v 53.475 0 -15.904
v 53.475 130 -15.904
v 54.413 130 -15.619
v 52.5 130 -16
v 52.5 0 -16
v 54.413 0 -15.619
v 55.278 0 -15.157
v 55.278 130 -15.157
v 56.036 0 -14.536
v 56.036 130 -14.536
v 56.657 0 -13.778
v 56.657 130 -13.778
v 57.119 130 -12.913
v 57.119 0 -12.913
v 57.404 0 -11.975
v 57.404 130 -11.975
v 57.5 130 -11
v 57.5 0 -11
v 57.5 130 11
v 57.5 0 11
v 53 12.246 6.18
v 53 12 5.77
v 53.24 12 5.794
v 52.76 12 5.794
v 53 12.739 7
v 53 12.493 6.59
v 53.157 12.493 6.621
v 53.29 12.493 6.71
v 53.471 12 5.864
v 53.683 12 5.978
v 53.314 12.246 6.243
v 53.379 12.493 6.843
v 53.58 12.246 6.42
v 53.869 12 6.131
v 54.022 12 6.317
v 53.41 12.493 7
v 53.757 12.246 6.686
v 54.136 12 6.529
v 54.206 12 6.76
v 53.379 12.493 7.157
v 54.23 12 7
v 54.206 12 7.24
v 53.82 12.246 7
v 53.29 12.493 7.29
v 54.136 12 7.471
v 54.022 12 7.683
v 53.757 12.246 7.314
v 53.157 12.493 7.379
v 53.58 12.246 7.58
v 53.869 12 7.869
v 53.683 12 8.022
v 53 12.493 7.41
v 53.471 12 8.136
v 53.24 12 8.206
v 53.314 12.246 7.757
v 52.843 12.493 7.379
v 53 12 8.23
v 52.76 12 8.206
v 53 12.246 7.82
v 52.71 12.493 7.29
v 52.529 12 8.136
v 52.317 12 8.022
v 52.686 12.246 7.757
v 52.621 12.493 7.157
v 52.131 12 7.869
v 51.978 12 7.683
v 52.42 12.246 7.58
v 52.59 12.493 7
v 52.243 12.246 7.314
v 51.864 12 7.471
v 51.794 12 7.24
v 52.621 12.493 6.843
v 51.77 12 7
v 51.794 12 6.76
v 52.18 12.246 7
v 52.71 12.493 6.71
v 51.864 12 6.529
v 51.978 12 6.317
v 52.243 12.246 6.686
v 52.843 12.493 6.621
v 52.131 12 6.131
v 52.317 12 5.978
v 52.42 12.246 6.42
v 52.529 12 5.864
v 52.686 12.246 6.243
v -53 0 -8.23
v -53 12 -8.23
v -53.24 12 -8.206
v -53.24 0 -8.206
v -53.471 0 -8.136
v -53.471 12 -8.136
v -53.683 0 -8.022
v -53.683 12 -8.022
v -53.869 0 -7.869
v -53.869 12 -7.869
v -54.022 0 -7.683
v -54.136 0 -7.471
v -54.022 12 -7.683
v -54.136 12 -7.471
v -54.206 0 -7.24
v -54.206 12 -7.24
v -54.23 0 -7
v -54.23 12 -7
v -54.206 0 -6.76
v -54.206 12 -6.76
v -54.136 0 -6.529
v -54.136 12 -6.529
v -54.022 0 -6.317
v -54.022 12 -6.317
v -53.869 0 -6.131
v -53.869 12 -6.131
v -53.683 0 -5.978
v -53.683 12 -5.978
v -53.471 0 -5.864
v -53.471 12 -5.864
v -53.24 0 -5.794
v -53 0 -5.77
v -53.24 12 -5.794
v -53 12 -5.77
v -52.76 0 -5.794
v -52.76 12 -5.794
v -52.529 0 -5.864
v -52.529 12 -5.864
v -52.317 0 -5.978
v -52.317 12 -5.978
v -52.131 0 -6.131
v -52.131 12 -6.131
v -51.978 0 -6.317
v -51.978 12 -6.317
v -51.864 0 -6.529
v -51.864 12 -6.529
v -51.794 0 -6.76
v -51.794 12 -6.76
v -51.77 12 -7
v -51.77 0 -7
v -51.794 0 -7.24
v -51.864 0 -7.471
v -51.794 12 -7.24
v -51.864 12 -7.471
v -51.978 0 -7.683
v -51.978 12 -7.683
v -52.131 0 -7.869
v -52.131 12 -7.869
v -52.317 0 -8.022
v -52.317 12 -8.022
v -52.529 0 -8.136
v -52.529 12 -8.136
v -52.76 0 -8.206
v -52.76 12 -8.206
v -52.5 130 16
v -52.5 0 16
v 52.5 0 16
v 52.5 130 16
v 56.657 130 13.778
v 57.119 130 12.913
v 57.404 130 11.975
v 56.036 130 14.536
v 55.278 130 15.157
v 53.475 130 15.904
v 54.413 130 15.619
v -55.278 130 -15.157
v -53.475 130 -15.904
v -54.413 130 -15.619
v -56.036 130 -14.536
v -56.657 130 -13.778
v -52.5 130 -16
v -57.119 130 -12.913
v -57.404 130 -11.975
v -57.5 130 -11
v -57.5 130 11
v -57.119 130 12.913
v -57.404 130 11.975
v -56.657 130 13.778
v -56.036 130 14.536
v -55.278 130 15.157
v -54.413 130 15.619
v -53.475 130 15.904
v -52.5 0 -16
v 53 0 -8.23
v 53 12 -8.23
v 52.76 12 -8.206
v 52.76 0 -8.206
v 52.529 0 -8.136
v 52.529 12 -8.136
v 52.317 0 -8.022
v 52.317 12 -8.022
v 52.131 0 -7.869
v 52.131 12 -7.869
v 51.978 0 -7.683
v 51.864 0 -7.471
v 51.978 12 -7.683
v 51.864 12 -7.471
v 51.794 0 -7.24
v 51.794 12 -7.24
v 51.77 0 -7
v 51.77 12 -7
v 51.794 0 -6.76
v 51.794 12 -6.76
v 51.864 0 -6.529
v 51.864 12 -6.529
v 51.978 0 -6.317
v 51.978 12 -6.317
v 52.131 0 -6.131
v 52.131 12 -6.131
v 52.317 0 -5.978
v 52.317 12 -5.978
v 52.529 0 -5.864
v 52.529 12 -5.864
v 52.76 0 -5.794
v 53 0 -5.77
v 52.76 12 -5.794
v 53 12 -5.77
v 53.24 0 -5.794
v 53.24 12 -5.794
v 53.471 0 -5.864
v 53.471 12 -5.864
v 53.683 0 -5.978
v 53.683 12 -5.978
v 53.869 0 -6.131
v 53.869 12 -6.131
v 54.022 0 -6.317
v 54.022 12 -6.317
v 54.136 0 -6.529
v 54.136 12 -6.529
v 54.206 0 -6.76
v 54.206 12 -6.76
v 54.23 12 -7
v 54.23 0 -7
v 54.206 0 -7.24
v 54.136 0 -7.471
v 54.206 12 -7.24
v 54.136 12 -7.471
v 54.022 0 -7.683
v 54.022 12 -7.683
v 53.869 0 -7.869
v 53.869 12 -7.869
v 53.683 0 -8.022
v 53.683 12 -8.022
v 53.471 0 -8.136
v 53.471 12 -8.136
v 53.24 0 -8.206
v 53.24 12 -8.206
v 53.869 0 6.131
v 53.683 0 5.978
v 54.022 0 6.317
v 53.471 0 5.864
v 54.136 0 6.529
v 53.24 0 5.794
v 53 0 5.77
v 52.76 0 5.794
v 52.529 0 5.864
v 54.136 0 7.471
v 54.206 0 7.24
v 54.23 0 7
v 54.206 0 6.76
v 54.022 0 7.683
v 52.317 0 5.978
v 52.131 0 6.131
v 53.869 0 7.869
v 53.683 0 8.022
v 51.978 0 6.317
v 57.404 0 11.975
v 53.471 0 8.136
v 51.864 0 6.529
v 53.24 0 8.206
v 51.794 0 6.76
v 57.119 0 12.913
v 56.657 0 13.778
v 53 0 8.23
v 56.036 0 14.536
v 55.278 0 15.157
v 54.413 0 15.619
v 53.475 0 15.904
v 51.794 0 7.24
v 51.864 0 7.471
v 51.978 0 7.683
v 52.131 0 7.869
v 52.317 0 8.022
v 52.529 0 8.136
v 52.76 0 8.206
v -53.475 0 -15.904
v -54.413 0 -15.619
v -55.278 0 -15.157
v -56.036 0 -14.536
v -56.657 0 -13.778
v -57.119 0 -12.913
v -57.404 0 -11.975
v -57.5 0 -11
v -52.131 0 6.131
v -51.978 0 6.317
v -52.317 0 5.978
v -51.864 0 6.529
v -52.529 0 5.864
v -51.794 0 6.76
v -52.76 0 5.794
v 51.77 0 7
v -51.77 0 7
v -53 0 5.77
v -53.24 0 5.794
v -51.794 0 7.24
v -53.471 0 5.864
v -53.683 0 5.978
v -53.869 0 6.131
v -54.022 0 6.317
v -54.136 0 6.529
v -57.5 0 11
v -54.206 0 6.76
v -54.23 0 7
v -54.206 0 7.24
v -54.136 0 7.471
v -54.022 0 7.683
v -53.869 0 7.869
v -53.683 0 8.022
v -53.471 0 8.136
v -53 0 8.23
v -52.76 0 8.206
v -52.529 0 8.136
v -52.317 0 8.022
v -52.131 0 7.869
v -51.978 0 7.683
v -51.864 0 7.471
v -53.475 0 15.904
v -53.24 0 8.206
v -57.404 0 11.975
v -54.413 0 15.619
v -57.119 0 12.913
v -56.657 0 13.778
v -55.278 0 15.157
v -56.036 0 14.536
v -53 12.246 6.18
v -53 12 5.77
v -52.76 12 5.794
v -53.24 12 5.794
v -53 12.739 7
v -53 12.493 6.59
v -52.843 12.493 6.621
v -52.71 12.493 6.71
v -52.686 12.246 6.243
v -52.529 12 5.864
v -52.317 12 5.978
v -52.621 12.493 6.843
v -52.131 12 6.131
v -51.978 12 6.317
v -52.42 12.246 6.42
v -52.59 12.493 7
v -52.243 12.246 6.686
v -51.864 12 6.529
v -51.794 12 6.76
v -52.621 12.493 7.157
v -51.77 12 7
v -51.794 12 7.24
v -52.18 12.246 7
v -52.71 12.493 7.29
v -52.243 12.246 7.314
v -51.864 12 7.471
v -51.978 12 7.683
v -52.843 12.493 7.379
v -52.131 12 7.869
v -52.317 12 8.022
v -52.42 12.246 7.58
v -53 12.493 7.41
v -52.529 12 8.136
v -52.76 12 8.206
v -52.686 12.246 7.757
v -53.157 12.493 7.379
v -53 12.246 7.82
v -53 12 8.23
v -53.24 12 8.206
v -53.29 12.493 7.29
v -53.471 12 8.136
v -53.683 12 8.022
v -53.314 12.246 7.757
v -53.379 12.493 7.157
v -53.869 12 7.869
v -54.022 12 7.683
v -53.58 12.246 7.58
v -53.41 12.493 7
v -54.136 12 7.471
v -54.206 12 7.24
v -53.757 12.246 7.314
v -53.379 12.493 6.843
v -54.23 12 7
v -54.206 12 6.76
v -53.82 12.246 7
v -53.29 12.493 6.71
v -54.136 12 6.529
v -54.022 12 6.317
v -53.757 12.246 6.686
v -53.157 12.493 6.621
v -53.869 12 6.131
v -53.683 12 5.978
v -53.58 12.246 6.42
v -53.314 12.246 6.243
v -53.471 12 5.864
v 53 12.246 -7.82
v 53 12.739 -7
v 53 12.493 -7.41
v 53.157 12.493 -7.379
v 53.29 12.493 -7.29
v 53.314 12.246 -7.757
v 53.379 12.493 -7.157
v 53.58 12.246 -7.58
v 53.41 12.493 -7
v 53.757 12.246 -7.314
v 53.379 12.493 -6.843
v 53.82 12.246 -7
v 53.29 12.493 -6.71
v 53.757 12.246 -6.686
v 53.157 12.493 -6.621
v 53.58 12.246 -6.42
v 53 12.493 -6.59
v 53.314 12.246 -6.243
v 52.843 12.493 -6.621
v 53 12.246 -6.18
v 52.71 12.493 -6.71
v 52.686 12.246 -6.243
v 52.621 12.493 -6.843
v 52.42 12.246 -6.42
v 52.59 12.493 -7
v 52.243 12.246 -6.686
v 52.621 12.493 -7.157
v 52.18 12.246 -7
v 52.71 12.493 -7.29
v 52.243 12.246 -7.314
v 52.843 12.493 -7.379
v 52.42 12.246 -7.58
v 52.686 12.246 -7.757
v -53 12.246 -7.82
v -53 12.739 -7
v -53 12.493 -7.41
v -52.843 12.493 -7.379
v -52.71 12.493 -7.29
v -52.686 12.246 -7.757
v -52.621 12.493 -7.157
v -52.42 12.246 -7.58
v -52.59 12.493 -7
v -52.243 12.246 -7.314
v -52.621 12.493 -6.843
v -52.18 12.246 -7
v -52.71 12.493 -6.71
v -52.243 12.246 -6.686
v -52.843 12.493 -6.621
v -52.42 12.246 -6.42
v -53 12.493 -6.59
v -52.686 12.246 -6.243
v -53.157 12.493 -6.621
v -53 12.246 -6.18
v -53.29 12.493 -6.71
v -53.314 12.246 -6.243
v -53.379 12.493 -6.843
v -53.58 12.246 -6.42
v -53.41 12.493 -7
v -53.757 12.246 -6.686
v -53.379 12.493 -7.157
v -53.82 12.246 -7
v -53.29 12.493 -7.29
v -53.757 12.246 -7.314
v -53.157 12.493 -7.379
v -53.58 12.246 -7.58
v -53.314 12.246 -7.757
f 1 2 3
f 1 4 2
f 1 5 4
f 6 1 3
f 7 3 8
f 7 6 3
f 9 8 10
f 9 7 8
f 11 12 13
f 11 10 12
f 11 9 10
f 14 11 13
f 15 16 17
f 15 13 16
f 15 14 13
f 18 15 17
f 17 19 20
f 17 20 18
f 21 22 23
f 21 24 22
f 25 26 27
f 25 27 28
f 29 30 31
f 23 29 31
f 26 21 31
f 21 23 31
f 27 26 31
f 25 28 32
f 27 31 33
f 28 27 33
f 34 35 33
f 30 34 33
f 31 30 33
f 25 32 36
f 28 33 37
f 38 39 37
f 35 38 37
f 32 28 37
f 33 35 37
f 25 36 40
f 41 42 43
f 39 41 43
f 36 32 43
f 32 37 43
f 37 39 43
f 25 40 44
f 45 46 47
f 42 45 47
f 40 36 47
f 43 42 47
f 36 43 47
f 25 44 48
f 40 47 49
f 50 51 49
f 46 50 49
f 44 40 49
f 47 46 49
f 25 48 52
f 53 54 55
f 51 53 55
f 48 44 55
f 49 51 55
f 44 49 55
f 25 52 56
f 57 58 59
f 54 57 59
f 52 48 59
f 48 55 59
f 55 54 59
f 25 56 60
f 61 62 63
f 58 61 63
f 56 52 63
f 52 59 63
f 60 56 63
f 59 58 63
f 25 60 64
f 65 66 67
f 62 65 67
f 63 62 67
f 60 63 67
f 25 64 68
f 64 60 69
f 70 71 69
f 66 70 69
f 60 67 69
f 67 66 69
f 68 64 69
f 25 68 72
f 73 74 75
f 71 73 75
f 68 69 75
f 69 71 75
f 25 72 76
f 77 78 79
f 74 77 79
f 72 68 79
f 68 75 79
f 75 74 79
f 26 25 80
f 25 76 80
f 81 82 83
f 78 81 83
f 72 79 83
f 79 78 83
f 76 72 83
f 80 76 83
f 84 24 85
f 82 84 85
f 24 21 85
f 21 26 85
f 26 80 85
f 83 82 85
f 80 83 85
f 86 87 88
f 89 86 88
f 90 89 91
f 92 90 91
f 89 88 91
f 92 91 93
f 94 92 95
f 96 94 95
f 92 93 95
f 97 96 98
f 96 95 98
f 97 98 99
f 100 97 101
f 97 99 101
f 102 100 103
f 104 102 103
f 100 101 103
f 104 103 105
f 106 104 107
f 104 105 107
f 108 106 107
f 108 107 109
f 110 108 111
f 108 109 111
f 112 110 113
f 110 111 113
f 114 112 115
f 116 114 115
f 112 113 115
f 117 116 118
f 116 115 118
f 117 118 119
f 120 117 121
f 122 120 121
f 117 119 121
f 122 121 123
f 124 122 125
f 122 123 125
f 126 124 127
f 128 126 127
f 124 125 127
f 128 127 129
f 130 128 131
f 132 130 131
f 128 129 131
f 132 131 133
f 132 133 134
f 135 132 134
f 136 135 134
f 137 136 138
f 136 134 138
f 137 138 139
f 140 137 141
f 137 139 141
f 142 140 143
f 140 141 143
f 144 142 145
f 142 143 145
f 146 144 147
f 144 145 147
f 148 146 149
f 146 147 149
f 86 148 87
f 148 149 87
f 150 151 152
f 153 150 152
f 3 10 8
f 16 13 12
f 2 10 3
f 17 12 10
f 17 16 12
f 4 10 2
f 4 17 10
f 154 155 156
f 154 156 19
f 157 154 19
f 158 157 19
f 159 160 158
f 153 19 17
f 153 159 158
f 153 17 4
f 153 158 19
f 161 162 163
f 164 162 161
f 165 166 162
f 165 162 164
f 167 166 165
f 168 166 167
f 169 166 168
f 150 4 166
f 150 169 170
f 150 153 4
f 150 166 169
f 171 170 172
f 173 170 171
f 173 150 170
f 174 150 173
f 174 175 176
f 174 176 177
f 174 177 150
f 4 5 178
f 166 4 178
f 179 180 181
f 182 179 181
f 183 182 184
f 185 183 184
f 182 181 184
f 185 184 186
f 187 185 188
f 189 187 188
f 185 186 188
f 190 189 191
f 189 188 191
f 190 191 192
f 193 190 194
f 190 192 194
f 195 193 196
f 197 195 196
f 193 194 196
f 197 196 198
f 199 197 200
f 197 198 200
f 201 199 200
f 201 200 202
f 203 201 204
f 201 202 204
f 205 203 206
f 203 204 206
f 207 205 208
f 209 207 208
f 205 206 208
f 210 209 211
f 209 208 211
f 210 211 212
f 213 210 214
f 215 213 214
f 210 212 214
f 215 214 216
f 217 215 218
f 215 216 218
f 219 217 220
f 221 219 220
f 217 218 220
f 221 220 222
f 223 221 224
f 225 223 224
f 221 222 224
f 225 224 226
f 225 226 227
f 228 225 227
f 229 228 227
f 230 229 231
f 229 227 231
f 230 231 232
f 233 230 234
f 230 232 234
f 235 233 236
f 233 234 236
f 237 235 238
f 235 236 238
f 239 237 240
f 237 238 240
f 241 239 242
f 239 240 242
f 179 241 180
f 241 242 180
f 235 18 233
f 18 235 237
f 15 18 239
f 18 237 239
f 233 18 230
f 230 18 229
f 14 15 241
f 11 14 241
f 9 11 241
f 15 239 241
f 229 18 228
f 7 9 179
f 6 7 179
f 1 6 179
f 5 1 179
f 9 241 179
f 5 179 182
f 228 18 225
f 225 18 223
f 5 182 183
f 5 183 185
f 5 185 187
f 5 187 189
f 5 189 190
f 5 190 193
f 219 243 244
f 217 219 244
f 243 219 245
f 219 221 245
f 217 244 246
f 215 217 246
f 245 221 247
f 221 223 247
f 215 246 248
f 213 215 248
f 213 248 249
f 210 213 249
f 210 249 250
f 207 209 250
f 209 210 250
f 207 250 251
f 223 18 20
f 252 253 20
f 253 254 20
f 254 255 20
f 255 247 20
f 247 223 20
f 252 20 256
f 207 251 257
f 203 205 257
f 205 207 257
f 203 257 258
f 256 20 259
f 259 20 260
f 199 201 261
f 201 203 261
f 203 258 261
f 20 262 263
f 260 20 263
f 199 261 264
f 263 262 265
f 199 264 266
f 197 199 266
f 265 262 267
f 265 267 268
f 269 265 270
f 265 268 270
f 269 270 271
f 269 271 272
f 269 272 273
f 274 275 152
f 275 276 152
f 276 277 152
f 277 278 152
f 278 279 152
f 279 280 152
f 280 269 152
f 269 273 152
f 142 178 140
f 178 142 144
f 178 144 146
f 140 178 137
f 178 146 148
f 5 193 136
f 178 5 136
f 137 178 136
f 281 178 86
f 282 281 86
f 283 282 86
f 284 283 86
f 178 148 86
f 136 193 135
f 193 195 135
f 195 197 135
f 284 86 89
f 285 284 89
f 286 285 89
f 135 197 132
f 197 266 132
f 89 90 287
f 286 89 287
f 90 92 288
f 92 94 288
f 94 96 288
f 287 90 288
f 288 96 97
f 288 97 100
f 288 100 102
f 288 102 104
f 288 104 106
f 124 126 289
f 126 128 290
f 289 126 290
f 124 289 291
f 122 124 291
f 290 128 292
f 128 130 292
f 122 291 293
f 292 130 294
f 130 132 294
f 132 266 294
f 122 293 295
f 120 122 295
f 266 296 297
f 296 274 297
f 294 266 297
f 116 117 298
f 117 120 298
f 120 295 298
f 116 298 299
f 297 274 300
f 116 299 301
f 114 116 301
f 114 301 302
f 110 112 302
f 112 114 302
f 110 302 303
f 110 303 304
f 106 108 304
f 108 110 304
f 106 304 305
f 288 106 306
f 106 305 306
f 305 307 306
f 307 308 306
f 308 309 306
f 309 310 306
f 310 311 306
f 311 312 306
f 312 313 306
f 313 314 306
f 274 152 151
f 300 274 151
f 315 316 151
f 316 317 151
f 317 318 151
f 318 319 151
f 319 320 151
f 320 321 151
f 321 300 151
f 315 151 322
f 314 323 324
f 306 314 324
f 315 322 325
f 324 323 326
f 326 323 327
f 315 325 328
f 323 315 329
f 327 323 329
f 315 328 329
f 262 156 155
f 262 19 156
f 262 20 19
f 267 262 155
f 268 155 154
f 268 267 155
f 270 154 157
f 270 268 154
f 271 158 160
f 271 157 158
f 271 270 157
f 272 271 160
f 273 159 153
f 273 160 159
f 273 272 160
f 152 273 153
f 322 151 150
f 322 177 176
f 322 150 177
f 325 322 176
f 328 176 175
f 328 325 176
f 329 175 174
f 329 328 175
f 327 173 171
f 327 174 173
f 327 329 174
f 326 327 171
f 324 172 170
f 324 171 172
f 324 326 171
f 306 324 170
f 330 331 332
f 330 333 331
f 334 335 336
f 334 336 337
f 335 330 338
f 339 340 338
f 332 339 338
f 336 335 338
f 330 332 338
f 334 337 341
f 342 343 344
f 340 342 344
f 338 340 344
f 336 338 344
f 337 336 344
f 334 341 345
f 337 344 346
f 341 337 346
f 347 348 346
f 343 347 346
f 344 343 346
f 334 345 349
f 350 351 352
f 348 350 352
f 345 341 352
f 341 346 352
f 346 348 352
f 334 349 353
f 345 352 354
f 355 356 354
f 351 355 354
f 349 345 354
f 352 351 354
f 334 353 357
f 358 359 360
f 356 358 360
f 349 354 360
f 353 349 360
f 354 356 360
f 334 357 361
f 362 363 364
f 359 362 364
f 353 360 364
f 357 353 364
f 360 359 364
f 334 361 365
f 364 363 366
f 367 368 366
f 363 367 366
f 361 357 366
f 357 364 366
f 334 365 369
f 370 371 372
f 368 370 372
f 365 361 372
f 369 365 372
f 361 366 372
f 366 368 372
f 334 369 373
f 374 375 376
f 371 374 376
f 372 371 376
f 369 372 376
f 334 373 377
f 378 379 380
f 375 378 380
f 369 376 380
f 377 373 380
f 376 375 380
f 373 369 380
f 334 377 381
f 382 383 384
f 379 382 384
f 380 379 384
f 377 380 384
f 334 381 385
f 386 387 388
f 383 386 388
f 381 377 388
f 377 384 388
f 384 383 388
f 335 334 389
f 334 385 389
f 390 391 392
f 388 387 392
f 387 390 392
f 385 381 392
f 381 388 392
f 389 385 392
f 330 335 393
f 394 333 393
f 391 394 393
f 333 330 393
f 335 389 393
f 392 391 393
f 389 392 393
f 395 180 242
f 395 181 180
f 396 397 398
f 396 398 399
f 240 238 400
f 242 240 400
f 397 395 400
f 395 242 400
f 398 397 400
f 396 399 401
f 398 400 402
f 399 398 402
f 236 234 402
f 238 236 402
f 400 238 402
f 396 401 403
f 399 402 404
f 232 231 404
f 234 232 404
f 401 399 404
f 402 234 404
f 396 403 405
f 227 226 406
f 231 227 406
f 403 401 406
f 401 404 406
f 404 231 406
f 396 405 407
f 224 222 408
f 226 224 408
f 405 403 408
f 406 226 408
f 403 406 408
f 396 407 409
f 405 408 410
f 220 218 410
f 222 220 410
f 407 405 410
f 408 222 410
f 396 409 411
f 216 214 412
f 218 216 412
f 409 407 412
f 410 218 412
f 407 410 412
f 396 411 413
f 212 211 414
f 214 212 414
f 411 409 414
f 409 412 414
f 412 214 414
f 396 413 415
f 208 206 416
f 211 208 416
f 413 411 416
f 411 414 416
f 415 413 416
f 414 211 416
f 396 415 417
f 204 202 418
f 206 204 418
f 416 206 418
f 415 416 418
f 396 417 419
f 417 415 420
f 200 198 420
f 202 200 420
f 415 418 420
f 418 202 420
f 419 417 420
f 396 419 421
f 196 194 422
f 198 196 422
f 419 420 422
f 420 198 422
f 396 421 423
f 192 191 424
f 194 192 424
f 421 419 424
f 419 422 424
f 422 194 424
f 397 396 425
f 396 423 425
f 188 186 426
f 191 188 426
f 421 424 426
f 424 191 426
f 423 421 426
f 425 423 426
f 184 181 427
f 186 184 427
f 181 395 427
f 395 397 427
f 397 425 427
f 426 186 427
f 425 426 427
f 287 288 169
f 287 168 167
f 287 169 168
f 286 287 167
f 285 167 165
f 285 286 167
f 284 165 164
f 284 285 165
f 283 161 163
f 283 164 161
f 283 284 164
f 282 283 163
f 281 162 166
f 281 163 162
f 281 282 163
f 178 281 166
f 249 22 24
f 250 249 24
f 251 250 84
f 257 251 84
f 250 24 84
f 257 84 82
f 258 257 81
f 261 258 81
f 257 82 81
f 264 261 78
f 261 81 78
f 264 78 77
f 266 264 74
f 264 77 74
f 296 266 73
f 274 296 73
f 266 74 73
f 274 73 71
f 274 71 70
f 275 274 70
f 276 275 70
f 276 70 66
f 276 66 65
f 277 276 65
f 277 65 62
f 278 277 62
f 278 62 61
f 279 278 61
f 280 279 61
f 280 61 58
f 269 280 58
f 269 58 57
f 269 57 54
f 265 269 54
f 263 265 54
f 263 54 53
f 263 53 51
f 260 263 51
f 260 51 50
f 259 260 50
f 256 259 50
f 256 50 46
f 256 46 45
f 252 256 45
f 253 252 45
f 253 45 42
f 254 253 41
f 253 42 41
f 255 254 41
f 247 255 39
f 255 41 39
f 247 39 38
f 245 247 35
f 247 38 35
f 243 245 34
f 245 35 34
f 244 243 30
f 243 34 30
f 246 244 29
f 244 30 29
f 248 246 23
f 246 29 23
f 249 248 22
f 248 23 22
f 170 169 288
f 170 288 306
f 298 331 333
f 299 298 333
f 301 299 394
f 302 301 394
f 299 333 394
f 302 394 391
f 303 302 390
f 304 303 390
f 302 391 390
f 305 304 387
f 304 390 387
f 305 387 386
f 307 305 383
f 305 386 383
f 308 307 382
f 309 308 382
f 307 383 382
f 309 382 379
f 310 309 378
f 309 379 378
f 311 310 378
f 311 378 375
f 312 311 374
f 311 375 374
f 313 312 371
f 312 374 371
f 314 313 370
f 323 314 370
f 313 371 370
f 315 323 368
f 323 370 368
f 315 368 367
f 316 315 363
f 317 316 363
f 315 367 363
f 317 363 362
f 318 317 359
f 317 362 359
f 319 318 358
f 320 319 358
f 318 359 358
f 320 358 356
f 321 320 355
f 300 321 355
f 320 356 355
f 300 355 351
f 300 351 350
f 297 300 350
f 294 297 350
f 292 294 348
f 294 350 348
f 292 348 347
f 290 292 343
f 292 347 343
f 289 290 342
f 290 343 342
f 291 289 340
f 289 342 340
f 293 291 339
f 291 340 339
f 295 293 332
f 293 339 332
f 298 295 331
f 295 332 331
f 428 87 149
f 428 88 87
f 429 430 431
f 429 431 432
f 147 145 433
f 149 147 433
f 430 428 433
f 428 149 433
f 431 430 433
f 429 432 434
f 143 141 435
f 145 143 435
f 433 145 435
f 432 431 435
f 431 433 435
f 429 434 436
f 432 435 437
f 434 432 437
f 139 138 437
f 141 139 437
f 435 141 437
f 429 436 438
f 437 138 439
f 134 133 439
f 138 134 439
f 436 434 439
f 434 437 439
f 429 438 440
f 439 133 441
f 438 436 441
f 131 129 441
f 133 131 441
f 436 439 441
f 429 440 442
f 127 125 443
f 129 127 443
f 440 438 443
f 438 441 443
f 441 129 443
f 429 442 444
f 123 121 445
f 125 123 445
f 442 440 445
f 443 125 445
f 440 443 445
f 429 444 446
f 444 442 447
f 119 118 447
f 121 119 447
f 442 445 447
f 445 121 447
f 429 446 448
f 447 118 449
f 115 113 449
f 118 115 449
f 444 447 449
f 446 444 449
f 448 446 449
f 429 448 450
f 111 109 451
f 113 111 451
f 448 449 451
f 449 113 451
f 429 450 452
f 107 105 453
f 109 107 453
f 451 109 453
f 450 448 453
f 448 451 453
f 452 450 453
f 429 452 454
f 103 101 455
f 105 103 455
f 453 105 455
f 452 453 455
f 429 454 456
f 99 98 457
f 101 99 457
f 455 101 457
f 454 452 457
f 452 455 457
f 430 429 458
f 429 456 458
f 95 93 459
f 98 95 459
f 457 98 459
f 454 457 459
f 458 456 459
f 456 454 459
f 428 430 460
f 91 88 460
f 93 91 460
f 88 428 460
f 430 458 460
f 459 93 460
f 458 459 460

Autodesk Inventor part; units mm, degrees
ref_plane "YZ Plane" through (0, 0, 0) normal (1, 0, 0) x (0, 1, 0)
ref_plane "XZ Plane" through (0, 0, 0) normal (0, 1, 0) x (-1, 0, 0)
ref_plane "XY Plane" through (0, 0, 0) normal (0, 0, 1) x (1, 0, 0)
sketch "Skizze1" plane through (0, 0, 0) normal (0, 1, 0) x (-1, 0, 0)
  line L0 (52.5, 16) -> (-52.5, 16)
  line L1 (-57.5, 11) -> (-57.5, -11)
  line L2 (-52.5, -16) -> (52.5, -16)
  line L3 (57.5, -11) -> (57.5, 11)
  line L4 (81.9497, 0) -> (-81.9497, 0) projected
  line L5 (0, -23.8497) -> (0, 23.8497) projected
  arc A0 (57.5, 11) -> (52.5, 16) centre (52.5, 11) ccw
  arc A1 (52.5, -16) -> (57.5, -11) centre (52.5, -11) ccw
  arc A2 (-52.5, 16) -> (-57.5, 11) centre (-52.5, 11) ccw
  arc A3 (-57.5, -11) -> (-52.5, -16) centre (-52.5, -11) ccw
  circle A4 centre (53, 7) radius 1.5
  circle A5 centre (53, -7) radius 1.5
  circle A6 centre (-53, 7) radius 1.5
  circle A7 centre (-53, -7) radius 1.5
  point P0 (0, 0)
  point P1 (57.5, 16)
  point P2 (-57.5, 16)
  point P3 (57.5, -16)
  dimension "d0" = 115
  dimension "d1" = 32
  dimension "d2" = 5
  dimension "d3" = 3
  dimension "d4" = 7
  dimension "d5" = 53
extrude "Extrusion1" add sketch "Skizze1" along normal blind 130 contours A0 L3 L4 L5 L0 | L5 L4 L1 A2 L0 | L5 L2 A3 L1 L4 | L4 L3 A1 L2 L5 | A4 | A5 | A6 | A7
hole "Bohrung1" at (53, 0, 7) at (53, 0, -7) at (-53, 0, 7) at (-53, 0, -7) direction (0, 1, 0) diameter 2.459 depth 12 tip angle 118 thread size "M3x0.5" class "6H" standard "ISO Metric profile"
properties part number "Lardis_grob"
